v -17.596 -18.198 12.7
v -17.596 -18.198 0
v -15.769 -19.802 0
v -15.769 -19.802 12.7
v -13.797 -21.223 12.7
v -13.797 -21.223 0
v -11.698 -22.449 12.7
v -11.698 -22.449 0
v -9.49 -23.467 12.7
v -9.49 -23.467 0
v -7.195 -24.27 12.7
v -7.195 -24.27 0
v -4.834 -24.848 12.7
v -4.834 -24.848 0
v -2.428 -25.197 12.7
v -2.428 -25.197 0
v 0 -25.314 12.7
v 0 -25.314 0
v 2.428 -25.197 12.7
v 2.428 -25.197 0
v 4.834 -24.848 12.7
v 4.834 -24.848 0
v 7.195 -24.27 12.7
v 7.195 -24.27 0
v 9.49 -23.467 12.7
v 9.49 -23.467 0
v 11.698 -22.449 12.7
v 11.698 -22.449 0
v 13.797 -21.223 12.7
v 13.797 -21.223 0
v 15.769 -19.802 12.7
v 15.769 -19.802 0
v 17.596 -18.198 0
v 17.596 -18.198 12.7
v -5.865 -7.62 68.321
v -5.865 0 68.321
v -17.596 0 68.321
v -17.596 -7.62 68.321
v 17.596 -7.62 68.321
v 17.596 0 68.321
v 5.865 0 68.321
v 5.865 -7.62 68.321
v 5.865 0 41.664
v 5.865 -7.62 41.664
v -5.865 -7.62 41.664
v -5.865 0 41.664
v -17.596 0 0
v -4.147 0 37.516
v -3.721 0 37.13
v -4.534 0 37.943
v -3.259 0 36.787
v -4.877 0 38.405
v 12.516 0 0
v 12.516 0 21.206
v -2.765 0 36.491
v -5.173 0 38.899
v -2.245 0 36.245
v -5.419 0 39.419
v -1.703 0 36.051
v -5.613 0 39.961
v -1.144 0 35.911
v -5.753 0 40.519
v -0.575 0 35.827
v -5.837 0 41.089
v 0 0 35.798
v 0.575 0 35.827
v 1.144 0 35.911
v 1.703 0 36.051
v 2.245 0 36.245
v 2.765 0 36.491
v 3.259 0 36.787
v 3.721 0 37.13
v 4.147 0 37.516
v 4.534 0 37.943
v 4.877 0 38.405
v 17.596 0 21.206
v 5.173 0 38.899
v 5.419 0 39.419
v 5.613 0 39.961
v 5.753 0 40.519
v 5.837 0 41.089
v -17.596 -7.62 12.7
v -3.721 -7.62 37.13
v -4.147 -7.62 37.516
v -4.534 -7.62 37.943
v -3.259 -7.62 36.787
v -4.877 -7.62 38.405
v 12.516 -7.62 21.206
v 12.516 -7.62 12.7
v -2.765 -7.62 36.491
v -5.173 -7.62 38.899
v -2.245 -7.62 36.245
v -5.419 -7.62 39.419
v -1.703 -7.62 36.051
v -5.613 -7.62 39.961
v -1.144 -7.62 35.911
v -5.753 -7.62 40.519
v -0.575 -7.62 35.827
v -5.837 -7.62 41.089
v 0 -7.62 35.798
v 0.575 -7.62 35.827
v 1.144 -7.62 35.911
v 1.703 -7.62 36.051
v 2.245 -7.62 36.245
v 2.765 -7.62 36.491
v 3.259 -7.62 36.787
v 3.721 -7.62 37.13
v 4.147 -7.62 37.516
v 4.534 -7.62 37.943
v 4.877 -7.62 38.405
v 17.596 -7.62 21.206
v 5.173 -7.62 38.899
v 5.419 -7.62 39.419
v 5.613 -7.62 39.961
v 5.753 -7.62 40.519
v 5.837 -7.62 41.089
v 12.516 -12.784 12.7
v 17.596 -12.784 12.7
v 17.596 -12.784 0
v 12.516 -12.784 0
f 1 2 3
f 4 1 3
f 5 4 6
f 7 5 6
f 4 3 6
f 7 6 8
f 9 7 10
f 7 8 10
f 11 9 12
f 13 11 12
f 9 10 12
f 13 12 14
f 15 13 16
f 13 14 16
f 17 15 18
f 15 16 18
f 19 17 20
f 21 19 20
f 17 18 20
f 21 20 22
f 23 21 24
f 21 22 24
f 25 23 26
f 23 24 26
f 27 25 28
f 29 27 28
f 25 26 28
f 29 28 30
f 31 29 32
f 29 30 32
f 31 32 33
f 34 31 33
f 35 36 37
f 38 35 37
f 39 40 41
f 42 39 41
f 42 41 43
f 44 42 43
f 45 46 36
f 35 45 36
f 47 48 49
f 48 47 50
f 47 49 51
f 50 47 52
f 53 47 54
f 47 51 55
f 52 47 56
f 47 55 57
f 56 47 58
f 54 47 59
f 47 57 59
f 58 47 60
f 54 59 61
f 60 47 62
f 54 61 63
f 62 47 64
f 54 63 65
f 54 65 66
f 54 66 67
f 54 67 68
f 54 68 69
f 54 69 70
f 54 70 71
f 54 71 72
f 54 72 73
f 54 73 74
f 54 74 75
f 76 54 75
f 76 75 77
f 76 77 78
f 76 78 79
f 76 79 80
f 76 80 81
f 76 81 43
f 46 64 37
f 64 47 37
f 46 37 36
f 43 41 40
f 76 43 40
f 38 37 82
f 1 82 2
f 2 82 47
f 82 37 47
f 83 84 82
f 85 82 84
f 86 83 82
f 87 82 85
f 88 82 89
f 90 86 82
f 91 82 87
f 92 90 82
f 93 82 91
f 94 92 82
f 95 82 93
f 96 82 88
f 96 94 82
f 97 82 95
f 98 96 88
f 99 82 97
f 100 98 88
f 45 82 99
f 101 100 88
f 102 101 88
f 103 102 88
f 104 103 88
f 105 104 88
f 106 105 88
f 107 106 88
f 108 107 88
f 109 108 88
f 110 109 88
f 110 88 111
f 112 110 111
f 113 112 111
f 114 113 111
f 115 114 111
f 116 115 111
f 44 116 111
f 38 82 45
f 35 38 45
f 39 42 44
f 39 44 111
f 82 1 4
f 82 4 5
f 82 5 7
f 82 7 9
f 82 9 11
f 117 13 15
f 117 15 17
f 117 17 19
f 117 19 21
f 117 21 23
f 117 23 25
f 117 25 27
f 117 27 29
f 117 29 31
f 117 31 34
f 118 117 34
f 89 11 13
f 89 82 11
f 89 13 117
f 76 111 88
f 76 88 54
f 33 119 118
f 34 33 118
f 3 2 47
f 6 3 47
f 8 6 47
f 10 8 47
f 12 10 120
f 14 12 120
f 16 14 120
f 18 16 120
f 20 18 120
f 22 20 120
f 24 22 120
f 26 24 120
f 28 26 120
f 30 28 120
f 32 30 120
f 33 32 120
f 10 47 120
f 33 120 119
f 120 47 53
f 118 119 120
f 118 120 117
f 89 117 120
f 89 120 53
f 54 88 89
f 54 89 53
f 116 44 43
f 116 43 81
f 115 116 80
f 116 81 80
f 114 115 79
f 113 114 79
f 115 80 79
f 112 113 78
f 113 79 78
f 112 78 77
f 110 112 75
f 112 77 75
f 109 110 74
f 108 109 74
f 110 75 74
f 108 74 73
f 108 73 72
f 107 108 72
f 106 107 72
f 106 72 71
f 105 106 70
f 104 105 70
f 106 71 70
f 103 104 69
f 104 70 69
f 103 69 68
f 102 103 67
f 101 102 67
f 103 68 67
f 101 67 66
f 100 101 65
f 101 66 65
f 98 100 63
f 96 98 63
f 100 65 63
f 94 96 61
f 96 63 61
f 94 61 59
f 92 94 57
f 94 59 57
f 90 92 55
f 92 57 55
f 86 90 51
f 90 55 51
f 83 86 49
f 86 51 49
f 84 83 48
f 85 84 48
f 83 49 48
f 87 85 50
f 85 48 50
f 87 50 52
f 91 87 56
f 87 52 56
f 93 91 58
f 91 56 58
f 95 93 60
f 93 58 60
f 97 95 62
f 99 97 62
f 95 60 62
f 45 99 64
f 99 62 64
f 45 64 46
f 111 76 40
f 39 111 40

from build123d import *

# Parameters (mm, degrees)
F1_DEPTH = 12.7
F3_DEPTH = 7.62
F4_W     = 12.783553
F4_H     = 21.205658
F5_DEPTH = 5.08


with BuildPart() as f1:
    # F0 (on Top) → F1 (new body)
    with BuildSketch(Plane.XY):
        with BuildLine():
            Line((17.596183, -18.197764), (17.596183, 0))
            Line((17.596183, 0), (-17.596183, 0))
            Line((-17.596183, 0), (-17.596183, -18.197764))
            ThreePointArc((-17.596183, -18.197764), (0, -25.313717), (17.596183, -18.197764))
        make_face()
    extrude(amount=F1_DEPTH)

    # F2 (on Front) → F3 (join)
    with BuildSketch(Plane.XZ):
        with BuildLine():
            Line((-17.596183, 12.7), (17.596183, 12.7))
            Line((17.596183, 12.7), (17.596183, 68.321375))
            Line((17.596183, 68.321375), (5.865396, 68.321375))
            Line((5.865396, 68.321375), (5.865396, 41.663684))
            ThreePointArc((5.865396, 41.663684), (0, 35.798287), (-5.865396, 41.663684))
            Line((-5.865396, 41.663684), (-5.865396, 68.321375))
            Line((-5.865396, 68.321375), (-17.596183, 68.321375))
            Line((-17.596183, 68.321375), (-17.596183, 12.7))
        make_face()
    extrude(amount=F3_DEPTH)

    # F4 (on face) → F5 (cut)
    with BuildSketch(Plane.YZ.offset(17.596183)):
        with Locations((-6.391776, 10.602829)):
            Rectangle(F4_W, F4_H)
    extrude(amount=-F5_DEPTH, mode=Mode.SUBTRACT)


solid = f1.part
